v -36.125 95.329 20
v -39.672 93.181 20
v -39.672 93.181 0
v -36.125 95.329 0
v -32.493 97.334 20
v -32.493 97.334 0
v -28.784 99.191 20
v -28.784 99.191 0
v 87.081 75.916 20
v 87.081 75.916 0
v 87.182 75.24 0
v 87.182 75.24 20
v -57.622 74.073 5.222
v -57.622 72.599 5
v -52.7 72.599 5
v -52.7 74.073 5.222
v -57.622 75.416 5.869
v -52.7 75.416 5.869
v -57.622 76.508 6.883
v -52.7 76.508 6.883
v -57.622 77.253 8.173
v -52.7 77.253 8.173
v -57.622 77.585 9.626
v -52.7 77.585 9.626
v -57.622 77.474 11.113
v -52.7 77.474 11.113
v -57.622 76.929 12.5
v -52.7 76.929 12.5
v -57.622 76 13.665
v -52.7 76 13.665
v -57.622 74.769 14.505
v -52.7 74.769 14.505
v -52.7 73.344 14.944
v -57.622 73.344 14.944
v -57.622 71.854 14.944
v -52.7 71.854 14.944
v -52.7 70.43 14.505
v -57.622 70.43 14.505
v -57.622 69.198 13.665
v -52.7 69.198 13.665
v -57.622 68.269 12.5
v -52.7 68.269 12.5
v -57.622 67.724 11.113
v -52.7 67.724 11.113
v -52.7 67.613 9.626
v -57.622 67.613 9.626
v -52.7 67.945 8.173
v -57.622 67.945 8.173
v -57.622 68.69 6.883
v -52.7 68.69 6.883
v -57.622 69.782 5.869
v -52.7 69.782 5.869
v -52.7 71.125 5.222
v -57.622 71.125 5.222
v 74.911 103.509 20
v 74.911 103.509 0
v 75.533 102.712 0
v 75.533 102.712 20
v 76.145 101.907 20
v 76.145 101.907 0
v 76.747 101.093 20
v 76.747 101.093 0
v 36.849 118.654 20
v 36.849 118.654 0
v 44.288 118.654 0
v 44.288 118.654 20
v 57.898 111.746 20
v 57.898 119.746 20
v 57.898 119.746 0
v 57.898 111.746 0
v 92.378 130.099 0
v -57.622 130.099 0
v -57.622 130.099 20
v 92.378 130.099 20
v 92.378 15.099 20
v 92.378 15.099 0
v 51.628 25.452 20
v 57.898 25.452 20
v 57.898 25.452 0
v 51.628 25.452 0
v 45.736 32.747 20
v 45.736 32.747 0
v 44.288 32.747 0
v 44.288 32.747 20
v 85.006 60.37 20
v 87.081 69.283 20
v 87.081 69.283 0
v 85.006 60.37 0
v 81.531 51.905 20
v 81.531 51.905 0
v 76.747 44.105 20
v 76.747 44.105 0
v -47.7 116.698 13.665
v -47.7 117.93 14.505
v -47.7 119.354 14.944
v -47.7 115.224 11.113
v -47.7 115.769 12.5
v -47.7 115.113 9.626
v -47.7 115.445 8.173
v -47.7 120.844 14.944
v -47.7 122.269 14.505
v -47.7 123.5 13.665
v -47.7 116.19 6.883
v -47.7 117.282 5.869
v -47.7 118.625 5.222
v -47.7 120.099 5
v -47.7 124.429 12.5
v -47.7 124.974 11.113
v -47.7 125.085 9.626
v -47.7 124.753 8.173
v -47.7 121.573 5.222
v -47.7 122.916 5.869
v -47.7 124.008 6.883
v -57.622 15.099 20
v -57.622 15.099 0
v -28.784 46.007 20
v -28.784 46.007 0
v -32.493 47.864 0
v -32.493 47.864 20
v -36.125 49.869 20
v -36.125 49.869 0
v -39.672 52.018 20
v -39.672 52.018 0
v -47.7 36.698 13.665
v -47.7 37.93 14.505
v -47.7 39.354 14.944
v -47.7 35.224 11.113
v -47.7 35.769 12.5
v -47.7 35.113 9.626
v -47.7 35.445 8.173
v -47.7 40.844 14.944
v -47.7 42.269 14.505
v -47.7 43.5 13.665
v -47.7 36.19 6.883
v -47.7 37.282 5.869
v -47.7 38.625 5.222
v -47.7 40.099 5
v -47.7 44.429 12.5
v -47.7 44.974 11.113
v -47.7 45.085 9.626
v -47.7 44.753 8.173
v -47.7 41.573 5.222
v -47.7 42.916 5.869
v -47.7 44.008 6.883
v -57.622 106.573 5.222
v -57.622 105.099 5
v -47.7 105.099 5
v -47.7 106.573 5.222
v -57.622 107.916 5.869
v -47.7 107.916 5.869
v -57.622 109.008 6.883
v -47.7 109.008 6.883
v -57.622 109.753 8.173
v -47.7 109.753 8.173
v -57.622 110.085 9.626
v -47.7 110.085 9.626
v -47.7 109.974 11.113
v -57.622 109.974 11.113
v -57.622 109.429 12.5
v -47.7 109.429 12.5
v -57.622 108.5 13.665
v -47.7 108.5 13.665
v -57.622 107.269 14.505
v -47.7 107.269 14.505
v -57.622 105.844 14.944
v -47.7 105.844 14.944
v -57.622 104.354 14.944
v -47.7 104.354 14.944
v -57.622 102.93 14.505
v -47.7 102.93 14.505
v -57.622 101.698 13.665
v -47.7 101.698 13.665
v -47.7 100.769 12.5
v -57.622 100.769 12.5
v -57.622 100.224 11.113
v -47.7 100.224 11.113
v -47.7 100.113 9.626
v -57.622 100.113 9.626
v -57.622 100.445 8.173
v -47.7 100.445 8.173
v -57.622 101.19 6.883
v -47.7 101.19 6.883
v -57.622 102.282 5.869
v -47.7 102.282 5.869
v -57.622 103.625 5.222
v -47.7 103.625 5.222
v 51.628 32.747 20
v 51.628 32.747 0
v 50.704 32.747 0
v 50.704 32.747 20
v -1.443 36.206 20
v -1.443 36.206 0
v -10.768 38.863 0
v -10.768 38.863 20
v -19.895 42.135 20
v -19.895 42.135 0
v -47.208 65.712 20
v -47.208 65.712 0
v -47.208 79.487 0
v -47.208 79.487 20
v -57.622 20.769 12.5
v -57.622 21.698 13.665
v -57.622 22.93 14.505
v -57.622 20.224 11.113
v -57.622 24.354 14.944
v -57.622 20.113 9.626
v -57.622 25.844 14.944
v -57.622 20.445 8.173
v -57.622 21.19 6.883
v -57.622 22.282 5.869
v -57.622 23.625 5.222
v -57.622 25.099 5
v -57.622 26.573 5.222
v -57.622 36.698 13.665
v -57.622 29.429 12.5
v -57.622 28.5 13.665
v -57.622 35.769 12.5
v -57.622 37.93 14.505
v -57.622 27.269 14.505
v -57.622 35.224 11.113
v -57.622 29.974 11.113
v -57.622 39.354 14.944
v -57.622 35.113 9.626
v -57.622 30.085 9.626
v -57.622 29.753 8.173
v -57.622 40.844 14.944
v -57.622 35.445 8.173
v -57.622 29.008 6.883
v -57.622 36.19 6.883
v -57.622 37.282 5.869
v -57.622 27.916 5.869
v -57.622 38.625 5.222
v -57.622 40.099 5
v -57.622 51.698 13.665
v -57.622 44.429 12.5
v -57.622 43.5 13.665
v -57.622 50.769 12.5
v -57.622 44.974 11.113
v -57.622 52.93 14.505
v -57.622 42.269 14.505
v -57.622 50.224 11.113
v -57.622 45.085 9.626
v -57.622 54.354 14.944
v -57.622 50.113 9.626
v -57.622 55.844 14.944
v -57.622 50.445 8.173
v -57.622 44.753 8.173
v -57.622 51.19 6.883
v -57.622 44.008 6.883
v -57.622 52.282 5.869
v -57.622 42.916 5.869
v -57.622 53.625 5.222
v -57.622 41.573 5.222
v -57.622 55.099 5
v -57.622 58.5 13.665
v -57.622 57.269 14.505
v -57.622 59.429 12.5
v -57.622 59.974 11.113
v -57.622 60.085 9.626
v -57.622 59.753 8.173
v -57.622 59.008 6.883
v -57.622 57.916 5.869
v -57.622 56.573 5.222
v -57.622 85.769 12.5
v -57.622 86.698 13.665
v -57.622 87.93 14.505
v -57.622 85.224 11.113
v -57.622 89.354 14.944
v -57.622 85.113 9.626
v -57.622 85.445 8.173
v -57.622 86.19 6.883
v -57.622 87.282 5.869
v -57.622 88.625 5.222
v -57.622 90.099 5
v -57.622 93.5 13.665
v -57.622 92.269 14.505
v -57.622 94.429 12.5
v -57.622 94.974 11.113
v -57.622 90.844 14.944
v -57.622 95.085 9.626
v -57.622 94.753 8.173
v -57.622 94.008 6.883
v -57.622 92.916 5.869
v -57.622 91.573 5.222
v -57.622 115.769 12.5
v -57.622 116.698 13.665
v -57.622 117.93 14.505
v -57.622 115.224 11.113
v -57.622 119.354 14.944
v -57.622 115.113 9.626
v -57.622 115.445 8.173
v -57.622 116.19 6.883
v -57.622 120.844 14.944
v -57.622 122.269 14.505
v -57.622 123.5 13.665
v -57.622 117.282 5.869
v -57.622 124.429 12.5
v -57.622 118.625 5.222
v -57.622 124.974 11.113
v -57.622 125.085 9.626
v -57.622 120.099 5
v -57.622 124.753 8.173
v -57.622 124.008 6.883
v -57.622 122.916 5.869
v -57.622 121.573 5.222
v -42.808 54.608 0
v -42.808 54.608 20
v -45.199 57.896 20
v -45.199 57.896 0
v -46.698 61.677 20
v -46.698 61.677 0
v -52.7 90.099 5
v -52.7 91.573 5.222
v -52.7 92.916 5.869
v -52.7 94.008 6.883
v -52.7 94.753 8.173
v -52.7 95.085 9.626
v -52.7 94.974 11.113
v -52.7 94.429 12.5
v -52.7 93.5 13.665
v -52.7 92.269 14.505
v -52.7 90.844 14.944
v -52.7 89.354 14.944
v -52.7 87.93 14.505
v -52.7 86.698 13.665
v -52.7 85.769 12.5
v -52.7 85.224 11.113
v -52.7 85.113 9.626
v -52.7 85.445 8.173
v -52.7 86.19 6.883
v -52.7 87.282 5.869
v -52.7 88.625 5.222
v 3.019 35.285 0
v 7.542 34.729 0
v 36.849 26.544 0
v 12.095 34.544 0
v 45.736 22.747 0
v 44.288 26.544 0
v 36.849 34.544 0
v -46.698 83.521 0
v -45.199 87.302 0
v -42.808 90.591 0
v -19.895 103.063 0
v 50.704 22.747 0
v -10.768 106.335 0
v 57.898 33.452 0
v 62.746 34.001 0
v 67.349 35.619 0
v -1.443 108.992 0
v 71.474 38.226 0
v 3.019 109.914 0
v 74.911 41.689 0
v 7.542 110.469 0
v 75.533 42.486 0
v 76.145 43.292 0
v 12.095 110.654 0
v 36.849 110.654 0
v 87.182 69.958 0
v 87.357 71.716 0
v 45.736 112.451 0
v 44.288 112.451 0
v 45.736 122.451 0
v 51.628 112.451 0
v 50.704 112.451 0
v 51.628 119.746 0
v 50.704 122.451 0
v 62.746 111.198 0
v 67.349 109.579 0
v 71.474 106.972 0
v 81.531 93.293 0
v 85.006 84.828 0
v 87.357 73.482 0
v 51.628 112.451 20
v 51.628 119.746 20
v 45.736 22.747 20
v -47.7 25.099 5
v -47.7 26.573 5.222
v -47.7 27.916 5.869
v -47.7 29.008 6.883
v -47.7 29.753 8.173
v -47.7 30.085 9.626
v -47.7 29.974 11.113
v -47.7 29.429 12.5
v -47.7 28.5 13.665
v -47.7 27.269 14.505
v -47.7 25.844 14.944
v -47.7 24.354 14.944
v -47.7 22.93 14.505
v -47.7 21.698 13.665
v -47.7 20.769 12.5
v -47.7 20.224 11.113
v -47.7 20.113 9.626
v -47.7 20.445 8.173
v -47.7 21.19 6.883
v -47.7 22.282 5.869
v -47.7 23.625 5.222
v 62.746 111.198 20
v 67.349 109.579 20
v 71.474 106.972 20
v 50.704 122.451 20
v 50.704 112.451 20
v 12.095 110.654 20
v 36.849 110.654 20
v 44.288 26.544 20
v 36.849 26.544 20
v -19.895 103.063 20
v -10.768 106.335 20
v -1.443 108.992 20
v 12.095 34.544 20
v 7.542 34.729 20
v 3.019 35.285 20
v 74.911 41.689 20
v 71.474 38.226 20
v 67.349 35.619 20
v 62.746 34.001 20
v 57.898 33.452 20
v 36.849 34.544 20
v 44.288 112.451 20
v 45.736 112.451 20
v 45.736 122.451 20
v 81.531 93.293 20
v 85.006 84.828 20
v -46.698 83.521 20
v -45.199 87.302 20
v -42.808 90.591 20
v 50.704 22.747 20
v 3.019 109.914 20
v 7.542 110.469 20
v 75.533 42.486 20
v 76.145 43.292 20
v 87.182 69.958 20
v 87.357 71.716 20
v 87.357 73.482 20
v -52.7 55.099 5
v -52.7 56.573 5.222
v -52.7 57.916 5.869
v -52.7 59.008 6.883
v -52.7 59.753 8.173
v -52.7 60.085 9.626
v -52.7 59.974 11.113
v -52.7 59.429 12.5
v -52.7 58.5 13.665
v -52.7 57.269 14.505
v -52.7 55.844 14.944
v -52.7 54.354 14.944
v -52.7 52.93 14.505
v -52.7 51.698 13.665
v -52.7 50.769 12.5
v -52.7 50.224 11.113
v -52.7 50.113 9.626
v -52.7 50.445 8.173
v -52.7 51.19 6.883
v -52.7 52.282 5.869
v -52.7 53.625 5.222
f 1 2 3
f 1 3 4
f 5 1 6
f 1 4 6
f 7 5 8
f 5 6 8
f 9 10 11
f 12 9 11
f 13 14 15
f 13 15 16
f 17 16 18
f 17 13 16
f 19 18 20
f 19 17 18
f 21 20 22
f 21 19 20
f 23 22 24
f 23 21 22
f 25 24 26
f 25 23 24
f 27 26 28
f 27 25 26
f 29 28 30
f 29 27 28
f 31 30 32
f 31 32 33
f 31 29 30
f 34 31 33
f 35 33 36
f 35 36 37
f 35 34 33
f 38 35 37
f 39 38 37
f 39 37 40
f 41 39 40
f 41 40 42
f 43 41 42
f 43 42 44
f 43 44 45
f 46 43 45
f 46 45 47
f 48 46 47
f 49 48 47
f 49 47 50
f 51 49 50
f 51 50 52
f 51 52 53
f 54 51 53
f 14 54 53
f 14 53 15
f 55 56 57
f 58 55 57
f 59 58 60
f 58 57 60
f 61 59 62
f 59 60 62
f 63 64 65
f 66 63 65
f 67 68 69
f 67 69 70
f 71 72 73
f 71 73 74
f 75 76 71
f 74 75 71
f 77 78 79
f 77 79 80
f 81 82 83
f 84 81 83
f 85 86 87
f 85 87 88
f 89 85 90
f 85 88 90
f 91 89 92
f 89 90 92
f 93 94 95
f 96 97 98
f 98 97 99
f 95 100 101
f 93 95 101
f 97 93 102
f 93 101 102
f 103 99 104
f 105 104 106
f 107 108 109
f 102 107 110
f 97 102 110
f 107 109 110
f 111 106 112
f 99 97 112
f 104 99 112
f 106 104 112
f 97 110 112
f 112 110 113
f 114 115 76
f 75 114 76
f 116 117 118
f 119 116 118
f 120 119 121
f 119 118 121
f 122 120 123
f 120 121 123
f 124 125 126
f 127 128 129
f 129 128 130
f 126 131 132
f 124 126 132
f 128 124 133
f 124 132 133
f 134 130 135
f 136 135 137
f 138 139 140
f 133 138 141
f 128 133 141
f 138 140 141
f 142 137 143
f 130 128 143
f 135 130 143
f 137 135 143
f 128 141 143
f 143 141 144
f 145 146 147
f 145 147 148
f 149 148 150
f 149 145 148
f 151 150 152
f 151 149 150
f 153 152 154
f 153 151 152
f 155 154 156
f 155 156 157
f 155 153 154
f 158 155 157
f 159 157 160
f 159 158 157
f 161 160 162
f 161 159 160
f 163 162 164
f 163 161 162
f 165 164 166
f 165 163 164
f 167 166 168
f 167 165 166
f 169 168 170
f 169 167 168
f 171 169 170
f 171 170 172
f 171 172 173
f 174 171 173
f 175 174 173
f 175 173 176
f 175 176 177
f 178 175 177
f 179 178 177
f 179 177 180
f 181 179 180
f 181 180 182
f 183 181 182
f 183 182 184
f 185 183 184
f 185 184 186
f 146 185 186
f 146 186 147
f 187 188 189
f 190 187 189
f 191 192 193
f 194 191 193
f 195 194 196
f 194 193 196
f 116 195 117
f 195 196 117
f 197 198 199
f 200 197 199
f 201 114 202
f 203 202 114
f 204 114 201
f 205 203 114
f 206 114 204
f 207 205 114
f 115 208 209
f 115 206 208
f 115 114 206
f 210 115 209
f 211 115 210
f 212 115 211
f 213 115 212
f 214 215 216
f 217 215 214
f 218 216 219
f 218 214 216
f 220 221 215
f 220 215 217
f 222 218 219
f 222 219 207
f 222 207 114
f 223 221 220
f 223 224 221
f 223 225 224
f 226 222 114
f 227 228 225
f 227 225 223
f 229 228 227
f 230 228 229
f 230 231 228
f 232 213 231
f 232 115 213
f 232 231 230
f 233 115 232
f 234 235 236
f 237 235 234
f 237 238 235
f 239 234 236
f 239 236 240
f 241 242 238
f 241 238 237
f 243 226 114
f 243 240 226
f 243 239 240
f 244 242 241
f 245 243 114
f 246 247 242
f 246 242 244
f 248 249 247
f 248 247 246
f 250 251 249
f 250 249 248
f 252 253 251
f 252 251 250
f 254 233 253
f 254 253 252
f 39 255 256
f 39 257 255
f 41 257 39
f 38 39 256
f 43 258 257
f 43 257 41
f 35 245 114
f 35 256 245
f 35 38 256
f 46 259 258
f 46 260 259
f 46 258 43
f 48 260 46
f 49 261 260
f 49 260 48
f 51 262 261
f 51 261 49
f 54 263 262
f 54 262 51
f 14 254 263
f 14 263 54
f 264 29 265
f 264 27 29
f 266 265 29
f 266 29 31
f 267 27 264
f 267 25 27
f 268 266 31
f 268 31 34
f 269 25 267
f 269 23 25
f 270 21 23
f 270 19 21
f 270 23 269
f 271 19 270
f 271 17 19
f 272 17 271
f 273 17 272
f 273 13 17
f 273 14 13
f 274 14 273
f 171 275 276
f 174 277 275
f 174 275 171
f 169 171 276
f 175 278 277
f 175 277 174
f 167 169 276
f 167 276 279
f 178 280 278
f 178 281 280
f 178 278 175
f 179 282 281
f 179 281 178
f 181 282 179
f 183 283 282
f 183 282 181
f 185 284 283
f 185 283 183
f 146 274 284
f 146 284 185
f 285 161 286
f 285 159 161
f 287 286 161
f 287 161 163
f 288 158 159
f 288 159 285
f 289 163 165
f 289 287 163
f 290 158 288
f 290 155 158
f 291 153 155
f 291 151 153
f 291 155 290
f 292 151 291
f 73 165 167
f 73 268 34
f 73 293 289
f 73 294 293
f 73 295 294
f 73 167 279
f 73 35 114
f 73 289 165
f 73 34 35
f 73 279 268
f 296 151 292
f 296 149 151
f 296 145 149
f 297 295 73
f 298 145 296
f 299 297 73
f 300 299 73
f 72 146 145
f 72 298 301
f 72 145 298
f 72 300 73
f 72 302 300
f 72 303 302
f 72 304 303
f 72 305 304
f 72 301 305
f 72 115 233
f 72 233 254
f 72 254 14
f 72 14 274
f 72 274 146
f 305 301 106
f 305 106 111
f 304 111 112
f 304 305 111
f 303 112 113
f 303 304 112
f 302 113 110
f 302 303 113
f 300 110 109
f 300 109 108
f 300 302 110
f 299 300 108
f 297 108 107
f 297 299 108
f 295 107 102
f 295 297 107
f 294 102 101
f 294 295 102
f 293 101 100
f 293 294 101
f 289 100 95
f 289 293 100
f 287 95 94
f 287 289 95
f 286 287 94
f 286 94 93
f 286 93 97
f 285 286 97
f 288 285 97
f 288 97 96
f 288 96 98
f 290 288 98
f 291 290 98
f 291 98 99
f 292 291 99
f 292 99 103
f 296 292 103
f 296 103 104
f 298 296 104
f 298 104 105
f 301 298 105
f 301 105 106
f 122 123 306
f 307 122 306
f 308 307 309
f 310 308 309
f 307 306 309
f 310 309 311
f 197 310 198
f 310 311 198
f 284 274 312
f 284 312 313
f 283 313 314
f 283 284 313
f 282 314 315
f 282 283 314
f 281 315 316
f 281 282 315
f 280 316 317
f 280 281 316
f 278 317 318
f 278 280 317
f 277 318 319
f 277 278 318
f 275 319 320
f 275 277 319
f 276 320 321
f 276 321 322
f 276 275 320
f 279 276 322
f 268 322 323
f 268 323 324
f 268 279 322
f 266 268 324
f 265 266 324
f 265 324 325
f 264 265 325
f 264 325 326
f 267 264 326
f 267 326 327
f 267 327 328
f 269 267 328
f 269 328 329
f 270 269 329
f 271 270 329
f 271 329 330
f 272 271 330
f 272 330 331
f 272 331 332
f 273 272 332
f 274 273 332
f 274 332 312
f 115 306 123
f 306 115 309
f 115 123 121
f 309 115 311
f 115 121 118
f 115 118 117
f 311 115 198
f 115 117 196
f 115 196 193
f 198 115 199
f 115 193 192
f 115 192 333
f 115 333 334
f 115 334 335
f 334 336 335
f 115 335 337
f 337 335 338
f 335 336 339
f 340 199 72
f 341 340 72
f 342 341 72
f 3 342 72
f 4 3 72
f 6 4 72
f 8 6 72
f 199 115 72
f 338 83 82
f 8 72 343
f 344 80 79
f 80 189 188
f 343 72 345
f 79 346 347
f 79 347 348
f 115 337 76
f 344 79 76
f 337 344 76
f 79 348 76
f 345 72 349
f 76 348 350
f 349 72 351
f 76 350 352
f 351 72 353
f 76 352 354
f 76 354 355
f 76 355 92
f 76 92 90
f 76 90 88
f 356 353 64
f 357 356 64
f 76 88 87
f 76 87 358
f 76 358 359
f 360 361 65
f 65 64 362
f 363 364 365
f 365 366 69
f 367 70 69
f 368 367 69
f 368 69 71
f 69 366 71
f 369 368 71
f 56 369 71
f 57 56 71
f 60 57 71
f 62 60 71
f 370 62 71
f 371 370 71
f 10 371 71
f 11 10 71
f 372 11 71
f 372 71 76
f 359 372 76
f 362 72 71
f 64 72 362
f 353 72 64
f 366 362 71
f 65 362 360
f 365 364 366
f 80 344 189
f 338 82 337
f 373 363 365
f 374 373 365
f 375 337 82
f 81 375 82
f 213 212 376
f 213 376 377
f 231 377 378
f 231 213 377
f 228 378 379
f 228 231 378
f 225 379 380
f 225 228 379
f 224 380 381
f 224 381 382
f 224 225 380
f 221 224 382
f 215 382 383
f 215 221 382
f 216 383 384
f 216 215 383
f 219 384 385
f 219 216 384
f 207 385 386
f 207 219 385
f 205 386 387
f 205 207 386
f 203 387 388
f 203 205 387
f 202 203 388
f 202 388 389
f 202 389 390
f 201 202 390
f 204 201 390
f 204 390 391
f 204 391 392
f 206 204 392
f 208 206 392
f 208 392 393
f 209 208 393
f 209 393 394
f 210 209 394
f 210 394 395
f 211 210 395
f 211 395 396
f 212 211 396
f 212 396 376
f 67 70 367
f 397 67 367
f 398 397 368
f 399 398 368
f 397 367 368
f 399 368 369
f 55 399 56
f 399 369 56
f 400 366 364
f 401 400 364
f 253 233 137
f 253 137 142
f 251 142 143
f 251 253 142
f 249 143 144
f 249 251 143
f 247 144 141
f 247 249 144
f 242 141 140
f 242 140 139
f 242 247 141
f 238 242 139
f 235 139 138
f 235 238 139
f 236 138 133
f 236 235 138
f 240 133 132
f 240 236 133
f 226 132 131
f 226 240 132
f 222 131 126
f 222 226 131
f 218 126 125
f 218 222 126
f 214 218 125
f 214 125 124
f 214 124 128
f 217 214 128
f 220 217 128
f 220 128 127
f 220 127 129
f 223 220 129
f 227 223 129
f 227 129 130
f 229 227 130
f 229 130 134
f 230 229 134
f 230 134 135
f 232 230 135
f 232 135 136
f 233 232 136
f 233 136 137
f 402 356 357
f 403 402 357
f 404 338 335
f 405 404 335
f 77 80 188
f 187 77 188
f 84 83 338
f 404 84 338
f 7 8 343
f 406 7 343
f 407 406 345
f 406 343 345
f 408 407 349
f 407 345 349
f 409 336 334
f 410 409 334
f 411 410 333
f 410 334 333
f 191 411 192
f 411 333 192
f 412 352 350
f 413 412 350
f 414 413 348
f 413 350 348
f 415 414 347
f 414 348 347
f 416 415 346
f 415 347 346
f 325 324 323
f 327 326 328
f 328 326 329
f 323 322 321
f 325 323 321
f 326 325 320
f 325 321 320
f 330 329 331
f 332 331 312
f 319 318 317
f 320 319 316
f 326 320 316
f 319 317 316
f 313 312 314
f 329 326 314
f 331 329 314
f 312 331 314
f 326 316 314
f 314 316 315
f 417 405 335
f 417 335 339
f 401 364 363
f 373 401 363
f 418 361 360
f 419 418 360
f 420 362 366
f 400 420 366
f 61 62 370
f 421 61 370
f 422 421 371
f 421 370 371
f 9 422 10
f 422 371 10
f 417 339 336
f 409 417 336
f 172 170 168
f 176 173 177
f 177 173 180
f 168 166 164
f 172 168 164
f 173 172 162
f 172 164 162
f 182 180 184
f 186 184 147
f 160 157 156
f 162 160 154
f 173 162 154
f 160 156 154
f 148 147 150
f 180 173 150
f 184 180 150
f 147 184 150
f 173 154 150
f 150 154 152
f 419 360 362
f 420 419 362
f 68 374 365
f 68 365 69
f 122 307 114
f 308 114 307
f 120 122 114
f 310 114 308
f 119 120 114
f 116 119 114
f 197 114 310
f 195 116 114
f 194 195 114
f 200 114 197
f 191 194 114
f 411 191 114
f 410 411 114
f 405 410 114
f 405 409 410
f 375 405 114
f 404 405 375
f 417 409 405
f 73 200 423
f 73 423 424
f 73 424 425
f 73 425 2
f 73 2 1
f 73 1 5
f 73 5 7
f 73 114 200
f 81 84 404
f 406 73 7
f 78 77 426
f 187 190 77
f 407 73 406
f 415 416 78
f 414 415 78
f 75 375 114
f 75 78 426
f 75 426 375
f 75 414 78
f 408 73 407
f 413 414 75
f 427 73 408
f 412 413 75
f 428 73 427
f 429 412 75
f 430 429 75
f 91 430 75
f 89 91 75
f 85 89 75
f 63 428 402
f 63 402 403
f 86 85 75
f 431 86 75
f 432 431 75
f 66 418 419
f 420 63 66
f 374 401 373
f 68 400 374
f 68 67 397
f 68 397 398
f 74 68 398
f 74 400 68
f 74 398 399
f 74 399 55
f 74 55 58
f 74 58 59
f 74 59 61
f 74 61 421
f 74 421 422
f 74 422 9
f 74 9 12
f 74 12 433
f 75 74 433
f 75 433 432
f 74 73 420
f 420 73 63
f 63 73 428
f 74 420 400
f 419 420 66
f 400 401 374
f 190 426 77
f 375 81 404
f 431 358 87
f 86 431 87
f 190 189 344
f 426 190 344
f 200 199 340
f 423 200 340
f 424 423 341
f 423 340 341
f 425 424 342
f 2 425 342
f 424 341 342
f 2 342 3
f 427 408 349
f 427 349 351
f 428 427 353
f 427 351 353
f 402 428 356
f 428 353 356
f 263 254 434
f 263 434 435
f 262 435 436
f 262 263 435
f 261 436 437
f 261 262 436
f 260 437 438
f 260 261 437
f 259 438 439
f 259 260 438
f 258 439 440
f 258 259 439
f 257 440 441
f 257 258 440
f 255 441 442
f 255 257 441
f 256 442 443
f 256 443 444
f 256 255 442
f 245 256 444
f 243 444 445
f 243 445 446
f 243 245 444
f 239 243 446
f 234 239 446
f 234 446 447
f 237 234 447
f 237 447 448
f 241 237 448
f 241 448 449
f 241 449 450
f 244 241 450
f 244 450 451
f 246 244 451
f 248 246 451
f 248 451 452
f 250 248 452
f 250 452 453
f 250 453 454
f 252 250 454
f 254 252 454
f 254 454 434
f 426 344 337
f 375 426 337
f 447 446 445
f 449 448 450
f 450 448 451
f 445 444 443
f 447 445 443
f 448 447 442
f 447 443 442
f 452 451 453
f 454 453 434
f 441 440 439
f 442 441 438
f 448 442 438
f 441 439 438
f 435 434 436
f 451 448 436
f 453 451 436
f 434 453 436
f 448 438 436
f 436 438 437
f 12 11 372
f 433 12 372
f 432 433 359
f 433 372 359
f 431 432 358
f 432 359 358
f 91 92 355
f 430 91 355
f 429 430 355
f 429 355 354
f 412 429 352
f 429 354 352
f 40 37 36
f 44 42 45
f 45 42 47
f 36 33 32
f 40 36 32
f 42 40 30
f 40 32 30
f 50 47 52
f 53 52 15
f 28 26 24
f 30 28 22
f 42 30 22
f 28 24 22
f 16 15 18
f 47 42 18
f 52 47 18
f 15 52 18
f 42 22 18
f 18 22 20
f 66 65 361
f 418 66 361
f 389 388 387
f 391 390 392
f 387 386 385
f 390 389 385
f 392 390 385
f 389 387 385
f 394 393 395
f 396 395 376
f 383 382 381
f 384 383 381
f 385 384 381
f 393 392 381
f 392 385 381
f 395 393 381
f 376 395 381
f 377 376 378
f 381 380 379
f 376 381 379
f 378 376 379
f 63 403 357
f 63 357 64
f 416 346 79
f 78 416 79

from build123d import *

# Parameters (mm, degrees)
SKETCH_4_W          = 150
SKETCH_4_H          = 115
EXTRUDE_1_DEPTH     = 20
CUT_EXTRUDE_1_DEPTH = 20
SKETCH_6_R          = 5
CUT_EXTRUDE_7_DEPTH = 10
SKETCH_9_R          = 5
CUT_EXTRUDE_8_DEPTH = 5
SKETCH_11_R         = 5
CUT_EXTRUDE_9_DEPTH = 5


with BuildPart() as part:
    # 草圖4 → 填料-伸長1 (new body)
    with BuildSketch(Plane.XY):
        with Locations((17.378483322, 72.59909222)):
            Rectangle(SKETCH_4_W, SKETCH_4_H)
    extrude(amount=EXTRUDE_1_DEPTH)

    # 草圖2 → 除料-伸長1 (cut)
    with BuildSketch(Plane.XY):
        with BuildLine():
            Line((-47.207745562, 65.711609892), (-47.207745562, 79.486574548))
            ThreePointArc((-47.207745562, 79.486574548), (-45.199499918, 87.30172842), (-39.672345291, 93.180524415))
            ThreePointArc((-39.672345291, 93.180524415), (-34.318944815, 96.349970124), (-28.784309893, 99.191114091))
            ThreePointArc((-28.784309893, 99.191114091), (-15.358686248, 104.775217116), (-1.443024263, 108.992316634))
            ThreePointArc((-1.443024263, 108.992316634), (5.275172672, 110.237187628), (12.094993869, 110.654216049))
            Line((12.094993869, 110.654216049), (33.772014803, 110.654216049))
            Line((33.772014803, 110.654216049), (36.848505718, 110.654216049))
            Line((36.848505718, 110.654216049), (36.848505718, 118.654216049))
            Line((36.848505718, 118.654216049), (44.287834674, 118.654216049))
            Line((44.287834674, 118.654216049), (44.287834674, 112.450982223))
            Line((44.287834674, 112.450982223), (45.736024045, 112.450982223))
            Line((45.736024045, 112.450982223), (45.736024045, 122.450982223))
            Line((45.736024045, 122.450982223), (50.704341659, 122.450982223))
            Line((50.704341659, 122.450982223), (50.704341659, 112.450982223))
            Line((50.704341659, 112.450982223), (51.627972578, 112.450982223))
            Line((51.627972578, 112.450982223), (51.627972578, 119.746473649))
            Line((51.627972578, 119.746473649), (57.89832581, 119.746473649))
            Line((57.89832581, 119.746473649), (57.89832581, 111.746473649))
            ThreePointArc((57.89832581, 111.746473649), (67.349215797, 109.578876862), (74.910898446, 103.509383234))
            ThreePointArc((74.910898446, 103.509383234), (75.840394113, 102.31020351), (76.746696007, 101.093399876))
            ThreePointArc((76.746696007, 101.093399876), (83.438828083, 89.130434251), (87.081135301, 75.915640404))
            Line((87.081135301, 75.915640404), (87.182187493, 75.239707939))
            ThreePointArc((87.182187493, 75.239707939), (87.378483322, 72.59909222), (87.182187493, 69.958476501))
            Line((87.182187493, 69.958476501), (87.081135301, 69.282544036))
            ThreePointArc((87.081135301, 69.282544036), (83.438828083, 56.06775019), (76.746696007, 44.104784564))
            ThreePointArc((76.746696007, 44.104784564), (75.840394113, 42.887980931), (74.910898446, 41.688801206))
            ThreePointArc((74.910898446, 41.688801206), (67.349215797, 35.619307578), (57.89832581, 33.451710791))
            Line((57.89832581, 33.451710791), (57.89832581, 25.451710791))
            Line((57.89832581, 25.451710791), (51.627972578, 25.451710791))
            Line((51.627972578, 25.451710791), (51.627972578, 32.747202217))
            Line((51.627972578, 32.747202217), (50.704341659, 32.747202217))
            Line((50.704341659, 32.747202217), (50.704341659, 22.747202217))
            Line((50.704341659, 22.747202217), (45.736024045, 22.747202217))
            Line((45.736024045, 22.747202217), (45.736024045, 32.747202217))
            Line((45.736024045, 32.747202217), (44.287834674, 32.747202217))
            Line((44.287834674, 32.747202217), (44.287834674, 26.543968391))
            Line((44.287834674, 26.543968391), (36.848505718, 26.543968391))
            Line((36.848505718, 26.543968391), (36.848505718, 34.543968391))
            Line((36.848505718, 34.543968391), (33.772014803, 34.543968391))
            Line((33.772014803, 34.543968391), (12.094993869, 34.543968391))
            ThreePointArc((12.094993869, 34.543968391), (5.275172672, 34.960996812), (-1.443024263, 36.205867806))
            ThreePointArc((-1.443024263, 36.205867806), (-15.358686248, 40.422967325), (-28.784309893, 46.007070349))
            ThreePointArc((-28.784309893, 46.007070349), (-34.318944815, 48.848214316), (-39.672345291, 52.017660026))
            ThreePointArc((-39.672345291, 52.017660026), (-45.199499918, 57.89645602), (-47.207745562, 65.711609892))
        make_face()
    extrude(amount=CUT_EXTRUDE_1_DEPTH, mode=Mode.SUBTRACT)

    # 草圖6 → 除料-伸長7 (cut)
    with BuildSketch(Plane(origin=(-57.7, 0, 0), x_dir=(0, 0, -1), z_dir=(1, 0, 0))):
        with Locations((-10, 120.09909222)):
            Circle(SKETCH_6_R)
        with Locations((-10, 105.09909222)):
            Circle(SKETCH_6_R)
        with Locations((-10, 40.09909222)):
            Circle(SKETCH_6_R)
        with Locations((-10, 25.09909222)):
            Circle(SKETCH_6_R)
    extrude(amount=CUT_EXTRUDE_7_DEPTH, mode=Mode.SUBTRACT)

    # 草圖9 → 除料-伸長8 (cut)
    with BuildSketch(Plane(origin=(-57.7, 0, 0), x_dir=(0, 0, -1), z_dir=(1, 0, 0))):
        with Locations((-10, 90.09909222)):
            Circle(SKETCH_9_R)
        with Locations((-10, 55.09909222)):
            Circle(SKETCH_9_R)
    extrude(amount=CUT_EXTRUDE_8_DEPTH, mode=Mode.SUBTRACT)

    # 草圖11 → 除料-伸長9 (cut)
    with BuildSketch(Plane(origin=(-57.7, 0, 0), x_dir=(0, 0, -1), z_dir=(1, 0, 0))):
        with Locations((-10, 72.59909222)):
            Circle(SKETCH_11_R)
    extrude(amount=CUT_EXTRUDE_9_DEPTH, mode=Mode.SUBTRACT)


solid = part.part
